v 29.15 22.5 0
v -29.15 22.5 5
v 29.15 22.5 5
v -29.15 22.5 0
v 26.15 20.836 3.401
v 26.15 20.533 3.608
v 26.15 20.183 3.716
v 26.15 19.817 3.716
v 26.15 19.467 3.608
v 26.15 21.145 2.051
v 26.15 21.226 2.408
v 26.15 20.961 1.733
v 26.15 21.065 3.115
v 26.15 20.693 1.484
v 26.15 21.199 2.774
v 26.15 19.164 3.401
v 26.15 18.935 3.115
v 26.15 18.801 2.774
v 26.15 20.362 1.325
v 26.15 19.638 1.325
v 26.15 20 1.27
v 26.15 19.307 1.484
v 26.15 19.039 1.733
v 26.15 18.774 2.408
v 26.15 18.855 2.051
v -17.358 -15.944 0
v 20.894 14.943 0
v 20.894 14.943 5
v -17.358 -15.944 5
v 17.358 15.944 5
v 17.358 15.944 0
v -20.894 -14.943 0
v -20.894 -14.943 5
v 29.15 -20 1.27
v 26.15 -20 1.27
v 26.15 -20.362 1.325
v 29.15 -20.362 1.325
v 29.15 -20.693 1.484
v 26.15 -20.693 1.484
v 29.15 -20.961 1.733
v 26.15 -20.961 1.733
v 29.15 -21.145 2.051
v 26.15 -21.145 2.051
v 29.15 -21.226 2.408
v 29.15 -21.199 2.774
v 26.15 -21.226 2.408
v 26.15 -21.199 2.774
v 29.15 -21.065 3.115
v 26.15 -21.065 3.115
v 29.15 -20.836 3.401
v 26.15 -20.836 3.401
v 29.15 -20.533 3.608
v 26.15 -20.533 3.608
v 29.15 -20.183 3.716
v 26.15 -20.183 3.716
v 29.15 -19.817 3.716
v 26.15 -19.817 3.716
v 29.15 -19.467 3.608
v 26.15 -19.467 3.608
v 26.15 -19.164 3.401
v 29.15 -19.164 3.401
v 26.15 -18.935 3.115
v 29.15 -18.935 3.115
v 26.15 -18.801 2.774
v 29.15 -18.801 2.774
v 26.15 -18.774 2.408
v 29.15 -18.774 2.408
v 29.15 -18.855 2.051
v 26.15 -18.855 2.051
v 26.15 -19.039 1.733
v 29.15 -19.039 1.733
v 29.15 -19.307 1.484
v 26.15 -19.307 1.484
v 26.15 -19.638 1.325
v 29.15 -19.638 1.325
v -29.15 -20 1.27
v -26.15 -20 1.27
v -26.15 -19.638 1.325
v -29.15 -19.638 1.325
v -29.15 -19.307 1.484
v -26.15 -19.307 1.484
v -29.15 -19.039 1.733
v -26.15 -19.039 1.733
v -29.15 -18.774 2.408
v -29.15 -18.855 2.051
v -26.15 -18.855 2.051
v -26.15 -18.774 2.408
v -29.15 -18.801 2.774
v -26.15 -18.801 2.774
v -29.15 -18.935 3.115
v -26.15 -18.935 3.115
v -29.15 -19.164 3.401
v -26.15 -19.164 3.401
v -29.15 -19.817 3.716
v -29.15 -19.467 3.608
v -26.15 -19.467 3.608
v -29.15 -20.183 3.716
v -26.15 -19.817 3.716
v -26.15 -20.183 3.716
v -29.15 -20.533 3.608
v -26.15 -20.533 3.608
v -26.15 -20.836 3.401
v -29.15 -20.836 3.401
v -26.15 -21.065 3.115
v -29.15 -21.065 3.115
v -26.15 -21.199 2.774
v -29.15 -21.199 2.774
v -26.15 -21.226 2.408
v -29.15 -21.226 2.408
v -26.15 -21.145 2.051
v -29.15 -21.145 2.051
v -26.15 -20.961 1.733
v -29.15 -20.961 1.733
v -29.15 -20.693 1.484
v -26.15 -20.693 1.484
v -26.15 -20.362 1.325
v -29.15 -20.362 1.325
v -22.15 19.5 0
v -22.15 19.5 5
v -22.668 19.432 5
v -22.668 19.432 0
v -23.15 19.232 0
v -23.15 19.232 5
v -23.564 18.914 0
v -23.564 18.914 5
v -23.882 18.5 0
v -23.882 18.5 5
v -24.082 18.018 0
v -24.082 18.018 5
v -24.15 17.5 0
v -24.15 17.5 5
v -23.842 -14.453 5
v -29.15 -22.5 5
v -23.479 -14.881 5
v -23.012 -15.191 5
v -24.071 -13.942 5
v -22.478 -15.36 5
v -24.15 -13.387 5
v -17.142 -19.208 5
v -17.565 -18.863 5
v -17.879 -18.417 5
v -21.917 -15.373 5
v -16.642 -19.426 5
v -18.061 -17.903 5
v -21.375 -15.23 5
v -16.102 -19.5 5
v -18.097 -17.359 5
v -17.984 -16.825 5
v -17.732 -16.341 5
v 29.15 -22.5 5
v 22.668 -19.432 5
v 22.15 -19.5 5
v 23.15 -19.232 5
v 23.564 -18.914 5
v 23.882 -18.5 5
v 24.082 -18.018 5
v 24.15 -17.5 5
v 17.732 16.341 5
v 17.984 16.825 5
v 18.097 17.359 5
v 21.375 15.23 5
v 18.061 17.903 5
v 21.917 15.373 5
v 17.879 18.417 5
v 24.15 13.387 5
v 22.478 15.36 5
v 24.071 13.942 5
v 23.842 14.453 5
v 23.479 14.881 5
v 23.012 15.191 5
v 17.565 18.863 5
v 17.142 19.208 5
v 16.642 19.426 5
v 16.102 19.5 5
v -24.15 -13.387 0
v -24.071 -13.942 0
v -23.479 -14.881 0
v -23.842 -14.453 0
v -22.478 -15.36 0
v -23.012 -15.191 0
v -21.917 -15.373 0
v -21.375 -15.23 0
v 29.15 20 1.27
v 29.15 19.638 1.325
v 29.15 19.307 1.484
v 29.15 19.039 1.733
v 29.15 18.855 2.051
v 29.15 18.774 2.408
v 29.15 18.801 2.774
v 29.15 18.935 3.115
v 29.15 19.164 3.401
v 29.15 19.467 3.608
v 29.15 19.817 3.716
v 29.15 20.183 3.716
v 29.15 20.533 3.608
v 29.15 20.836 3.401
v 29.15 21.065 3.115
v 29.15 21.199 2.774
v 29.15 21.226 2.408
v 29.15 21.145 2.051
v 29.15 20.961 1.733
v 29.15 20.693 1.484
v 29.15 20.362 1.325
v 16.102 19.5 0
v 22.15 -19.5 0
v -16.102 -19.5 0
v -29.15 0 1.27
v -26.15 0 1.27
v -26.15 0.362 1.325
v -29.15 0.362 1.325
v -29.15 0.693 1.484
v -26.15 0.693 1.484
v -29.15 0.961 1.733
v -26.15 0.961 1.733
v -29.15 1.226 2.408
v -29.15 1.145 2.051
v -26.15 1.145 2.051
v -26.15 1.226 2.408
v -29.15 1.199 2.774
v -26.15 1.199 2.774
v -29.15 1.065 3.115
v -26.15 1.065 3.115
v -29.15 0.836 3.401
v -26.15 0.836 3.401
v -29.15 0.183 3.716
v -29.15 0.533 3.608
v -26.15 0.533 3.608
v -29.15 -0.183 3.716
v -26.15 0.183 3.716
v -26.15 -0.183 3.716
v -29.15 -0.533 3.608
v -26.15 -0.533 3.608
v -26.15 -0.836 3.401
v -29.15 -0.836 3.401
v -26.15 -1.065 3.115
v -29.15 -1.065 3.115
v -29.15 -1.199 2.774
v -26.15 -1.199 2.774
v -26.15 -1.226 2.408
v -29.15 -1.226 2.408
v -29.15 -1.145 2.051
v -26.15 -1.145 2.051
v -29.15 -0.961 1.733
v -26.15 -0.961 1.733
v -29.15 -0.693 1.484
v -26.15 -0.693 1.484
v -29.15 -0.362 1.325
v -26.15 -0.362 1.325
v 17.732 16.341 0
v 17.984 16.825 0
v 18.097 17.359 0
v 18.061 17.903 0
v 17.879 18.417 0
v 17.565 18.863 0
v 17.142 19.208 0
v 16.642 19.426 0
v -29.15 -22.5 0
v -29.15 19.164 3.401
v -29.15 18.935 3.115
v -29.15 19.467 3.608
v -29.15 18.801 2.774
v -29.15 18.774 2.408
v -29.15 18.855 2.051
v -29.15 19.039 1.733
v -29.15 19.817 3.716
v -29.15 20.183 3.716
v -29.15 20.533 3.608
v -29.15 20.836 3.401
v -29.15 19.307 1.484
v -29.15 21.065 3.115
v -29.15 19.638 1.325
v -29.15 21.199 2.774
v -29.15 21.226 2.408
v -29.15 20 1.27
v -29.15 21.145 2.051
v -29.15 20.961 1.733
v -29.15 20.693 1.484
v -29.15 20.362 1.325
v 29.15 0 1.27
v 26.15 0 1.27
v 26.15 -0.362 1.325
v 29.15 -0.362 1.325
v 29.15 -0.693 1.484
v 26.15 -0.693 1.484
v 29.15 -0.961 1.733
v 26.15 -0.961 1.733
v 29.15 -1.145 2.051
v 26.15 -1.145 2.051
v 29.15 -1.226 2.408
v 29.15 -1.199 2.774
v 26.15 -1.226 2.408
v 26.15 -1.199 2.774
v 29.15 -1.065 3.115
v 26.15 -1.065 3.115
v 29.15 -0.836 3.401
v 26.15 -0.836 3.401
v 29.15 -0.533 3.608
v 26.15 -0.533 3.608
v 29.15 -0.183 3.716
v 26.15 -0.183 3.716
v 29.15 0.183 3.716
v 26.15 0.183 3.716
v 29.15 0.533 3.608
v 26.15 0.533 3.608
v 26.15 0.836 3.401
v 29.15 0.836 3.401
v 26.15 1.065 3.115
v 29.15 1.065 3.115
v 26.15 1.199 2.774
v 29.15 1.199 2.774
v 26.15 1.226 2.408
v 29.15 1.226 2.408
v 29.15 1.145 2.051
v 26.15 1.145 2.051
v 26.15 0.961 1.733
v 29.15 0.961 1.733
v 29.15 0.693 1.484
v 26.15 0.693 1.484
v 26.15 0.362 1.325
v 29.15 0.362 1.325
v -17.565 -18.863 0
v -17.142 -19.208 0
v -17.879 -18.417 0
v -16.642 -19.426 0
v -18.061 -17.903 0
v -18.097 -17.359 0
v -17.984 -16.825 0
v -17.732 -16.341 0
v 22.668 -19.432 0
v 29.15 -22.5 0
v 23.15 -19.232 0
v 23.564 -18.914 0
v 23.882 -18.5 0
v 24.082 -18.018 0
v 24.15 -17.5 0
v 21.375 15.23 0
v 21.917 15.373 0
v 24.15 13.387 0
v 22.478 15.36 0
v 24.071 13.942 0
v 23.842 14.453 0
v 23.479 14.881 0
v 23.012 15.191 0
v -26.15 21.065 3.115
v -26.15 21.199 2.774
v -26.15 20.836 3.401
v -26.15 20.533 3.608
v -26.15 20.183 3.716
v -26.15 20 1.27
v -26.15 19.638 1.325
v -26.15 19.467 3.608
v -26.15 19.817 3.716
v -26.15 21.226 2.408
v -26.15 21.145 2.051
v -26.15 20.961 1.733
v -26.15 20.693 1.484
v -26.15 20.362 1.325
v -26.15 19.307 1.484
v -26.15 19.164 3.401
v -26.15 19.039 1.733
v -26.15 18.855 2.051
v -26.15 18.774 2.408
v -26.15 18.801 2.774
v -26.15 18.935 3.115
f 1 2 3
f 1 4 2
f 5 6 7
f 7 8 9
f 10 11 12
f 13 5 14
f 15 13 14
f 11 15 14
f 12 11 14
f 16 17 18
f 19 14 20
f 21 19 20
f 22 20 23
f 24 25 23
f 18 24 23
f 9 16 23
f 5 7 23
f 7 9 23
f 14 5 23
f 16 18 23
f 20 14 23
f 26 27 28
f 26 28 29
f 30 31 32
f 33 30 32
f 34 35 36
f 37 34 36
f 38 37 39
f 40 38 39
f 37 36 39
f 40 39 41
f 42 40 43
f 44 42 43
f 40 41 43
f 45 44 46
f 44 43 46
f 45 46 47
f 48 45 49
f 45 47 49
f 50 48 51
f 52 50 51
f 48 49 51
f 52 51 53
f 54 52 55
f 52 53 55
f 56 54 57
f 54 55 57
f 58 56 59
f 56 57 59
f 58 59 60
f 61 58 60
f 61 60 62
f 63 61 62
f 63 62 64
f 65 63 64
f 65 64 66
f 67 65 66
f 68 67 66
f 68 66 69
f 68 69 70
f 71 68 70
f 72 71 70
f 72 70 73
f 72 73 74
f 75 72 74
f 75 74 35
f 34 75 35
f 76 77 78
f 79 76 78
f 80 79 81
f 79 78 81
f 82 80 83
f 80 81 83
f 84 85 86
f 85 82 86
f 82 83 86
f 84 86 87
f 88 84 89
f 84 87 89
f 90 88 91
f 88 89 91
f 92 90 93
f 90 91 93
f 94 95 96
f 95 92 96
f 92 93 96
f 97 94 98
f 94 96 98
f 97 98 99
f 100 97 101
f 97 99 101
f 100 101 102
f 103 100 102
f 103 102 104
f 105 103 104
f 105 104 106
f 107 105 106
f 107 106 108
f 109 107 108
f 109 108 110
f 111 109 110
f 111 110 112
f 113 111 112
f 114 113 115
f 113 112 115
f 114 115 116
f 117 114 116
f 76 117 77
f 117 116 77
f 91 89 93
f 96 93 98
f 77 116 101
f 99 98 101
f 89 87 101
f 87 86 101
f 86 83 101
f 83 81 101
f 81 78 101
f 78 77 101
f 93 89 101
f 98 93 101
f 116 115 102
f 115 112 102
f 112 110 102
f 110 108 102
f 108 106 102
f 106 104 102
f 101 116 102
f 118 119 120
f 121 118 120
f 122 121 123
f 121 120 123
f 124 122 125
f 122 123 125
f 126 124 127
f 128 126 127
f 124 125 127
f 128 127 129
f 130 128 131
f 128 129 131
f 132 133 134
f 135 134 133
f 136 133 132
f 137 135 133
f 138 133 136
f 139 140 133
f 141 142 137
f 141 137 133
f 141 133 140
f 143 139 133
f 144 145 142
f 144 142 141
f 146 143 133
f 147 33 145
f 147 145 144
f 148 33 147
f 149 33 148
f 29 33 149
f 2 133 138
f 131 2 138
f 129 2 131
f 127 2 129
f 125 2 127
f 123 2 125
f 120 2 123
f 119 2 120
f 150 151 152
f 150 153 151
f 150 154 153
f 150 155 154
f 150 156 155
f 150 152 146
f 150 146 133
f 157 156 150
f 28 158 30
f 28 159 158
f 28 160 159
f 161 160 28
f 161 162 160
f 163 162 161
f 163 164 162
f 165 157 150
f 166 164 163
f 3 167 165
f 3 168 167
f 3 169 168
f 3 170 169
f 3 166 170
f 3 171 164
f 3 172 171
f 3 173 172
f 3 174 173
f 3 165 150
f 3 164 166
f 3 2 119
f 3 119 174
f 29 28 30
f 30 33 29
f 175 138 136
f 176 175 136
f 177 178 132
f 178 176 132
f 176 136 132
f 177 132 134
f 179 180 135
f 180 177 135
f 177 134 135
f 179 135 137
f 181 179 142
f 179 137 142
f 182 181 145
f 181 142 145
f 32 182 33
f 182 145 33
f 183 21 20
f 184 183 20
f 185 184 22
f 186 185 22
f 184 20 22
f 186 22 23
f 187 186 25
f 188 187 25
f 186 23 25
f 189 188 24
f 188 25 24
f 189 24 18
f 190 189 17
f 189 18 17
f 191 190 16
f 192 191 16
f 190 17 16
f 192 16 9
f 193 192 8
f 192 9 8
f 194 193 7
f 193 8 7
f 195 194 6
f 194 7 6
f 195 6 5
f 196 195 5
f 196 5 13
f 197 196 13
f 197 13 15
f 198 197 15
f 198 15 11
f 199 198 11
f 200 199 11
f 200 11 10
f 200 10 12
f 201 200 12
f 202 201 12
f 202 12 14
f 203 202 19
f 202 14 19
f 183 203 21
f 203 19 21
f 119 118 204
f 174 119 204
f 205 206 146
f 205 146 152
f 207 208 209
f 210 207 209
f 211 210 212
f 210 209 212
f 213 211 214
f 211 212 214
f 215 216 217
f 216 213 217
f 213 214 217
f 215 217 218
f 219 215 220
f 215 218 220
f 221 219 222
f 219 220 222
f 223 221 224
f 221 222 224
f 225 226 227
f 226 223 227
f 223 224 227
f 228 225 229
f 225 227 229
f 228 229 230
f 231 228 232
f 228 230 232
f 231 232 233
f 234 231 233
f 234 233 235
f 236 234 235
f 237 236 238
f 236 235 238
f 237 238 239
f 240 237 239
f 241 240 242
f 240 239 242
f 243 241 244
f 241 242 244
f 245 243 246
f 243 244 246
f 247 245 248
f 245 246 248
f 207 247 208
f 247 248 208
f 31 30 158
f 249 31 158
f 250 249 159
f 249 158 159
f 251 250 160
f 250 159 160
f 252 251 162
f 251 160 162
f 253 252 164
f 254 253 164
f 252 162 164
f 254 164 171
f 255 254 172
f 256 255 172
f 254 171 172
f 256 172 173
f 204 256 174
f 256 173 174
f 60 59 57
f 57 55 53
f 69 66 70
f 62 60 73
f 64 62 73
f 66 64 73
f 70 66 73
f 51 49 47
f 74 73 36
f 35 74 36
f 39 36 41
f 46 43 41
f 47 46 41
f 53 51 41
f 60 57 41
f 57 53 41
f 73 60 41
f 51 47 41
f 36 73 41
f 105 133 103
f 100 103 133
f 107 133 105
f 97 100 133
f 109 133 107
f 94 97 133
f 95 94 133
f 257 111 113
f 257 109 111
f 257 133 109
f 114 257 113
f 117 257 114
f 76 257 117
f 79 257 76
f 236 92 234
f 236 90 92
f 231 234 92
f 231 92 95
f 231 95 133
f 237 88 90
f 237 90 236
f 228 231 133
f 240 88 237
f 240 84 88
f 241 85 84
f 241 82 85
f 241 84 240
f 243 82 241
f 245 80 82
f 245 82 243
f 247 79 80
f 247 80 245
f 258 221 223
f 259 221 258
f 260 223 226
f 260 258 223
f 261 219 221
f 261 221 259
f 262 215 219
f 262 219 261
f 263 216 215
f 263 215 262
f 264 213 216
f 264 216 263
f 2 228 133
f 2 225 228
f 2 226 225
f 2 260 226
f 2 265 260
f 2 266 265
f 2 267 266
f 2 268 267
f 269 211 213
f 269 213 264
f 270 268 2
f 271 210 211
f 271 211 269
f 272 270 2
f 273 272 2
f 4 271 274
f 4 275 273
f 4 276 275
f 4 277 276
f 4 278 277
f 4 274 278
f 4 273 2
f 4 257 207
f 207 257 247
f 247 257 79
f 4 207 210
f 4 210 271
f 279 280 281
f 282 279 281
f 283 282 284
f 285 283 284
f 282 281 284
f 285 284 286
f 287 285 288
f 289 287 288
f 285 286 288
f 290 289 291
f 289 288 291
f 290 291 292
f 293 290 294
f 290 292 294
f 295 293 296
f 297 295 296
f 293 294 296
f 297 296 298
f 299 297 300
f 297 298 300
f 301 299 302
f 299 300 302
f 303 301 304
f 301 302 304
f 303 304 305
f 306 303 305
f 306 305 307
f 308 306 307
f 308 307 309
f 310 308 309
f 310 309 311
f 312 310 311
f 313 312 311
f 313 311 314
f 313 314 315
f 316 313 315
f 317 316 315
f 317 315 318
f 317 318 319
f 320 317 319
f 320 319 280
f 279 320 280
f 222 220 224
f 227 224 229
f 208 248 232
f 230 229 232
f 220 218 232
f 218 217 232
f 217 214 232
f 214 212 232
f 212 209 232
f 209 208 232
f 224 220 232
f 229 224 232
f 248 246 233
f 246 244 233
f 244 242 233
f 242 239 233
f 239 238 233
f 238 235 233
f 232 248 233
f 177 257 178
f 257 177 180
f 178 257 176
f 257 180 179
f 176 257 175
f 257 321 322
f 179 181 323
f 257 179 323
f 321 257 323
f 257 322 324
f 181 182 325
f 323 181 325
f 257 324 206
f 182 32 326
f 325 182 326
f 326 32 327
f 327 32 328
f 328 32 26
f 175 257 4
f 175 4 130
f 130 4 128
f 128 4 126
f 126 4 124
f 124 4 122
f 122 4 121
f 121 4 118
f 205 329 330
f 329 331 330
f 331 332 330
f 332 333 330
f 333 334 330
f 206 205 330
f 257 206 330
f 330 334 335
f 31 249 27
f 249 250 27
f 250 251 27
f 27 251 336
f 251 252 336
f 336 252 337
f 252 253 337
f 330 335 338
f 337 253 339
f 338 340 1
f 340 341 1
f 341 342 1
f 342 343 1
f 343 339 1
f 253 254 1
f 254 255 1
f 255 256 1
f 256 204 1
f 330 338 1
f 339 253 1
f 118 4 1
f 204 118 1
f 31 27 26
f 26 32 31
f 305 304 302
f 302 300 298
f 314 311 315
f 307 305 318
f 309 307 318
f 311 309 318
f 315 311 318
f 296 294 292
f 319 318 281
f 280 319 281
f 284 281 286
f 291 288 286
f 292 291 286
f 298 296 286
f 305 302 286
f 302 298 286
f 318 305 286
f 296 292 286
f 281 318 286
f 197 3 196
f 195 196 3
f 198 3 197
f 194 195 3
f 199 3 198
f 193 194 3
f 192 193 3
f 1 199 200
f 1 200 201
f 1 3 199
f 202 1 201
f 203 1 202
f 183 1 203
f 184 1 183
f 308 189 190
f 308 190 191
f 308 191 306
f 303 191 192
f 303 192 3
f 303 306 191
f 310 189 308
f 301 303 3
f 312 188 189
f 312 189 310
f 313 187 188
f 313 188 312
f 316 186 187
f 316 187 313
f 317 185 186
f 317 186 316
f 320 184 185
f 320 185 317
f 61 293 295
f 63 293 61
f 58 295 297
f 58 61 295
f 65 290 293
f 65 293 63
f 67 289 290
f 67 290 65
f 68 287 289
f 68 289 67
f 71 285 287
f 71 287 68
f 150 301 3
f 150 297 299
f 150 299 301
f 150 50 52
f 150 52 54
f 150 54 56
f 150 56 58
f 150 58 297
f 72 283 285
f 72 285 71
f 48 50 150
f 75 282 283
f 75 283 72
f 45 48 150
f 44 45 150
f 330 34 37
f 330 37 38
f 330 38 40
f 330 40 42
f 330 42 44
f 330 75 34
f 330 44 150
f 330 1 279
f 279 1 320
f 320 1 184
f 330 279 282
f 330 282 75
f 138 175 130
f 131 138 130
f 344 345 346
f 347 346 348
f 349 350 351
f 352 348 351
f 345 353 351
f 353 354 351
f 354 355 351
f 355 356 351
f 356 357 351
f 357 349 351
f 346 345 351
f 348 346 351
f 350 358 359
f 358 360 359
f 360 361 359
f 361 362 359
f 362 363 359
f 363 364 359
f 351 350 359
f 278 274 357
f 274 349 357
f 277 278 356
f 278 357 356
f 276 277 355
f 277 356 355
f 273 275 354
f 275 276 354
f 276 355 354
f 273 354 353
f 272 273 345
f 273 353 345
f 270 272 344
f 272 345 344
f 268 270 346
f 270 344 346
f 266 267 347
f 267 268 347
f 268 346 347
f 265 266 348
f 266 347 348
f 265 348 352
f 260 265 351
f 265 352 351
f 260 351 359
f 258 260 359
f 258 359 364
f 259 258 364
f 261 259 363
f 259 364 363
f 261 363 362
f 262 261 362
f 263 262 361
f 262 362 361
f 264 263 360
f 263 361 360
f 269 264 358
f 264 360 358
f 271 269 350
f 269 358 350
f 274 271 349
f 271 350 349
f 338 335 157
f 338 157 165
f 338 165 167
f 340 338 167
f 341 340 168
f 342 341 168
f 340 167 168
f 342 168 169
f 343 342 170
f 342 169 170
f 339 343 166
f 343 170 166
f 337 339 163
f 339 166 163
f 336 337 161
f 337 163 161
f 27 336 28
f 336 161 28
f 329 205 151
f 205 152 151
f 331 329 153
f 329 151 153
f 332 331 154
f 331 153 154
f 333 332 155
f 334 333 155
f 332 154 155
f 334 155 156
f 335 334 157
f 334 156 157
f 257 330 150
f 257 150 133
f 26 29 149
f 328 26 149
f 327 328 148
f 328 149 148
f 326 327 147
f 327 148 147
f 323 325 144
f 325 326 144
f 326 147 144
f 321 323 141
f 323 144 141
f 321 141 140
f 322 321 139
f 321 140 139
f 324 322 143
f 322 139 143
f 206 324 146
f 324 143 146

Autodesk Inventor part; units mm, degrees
ref_plane "YZ Plane" through (0, 0, 0) normal (1, 0, 0) x (0, 1, 0)
ref_plane "XZ Plane" through (0, 0, 0) normal (0, 1, 0) x (-1, 0, 0)
ref_plane "XY Plane" through (0, 0, 0) normal (0, 0, 1) x (1, 0, 0)
sketch "スケッチ1" plane through (0, 0, 0) normal (0, 0, 1) x (1, 0, 0)
  line L0 (-29.15, 22.5) -> (29.15, 22.5)
  line L1 (29.15, 22.5) -> (29.15, -22.5)
  line L2 (29.15, -22.5) -> (-29.15, -22.5)
  line L3 (-29.15, -22.5) -> (-29.15, 22.5)
  line L4 (-24.15, 19.5) -> (24.15, 19.5) construction
  line L5 (24.15, 19.5) -> (24.15, -19.5) construction
  line L6 (24.15, -19.5) -> (-24.15, -19.5) construction
  line L7 (-24.15, -19.5) -> (-24.15, 19.5) construction
  line L8 (24.15, 19.5) -> (-24.15, -19.5) construction
  line L9 (-24.15, -17.5721) -> (-24.15, 19.5)
  line L10 (-24.15, 19.5) -> (21.7623, 19.5)
  line L11 (21.7623, 19.5) -> (-24.15, -17.5721)
  line L12 (-21.7623, -19.5) -> (24.15, -19.5)
  line L13 (24.15, -19.5) -> (24.15, 17.5721)
  line L14 (24.15, 17.5721) -> (-21.7623, -19.5)
  line L15 (-29.15, 20) -> (29.15, 20) construction
  line L16 (29.15, -20) -> (-29.15, -20) construction
  line L17 (29.15, 20) -> (29.15, -20) construction
  point P0 (0, 0)
  point P1 (0, 19.5)
  point P2 (0, 22.5)
  point P3 (24.15, 0)
  point P4 (29.15, 0)
  dimension "d0" = 5
  dimension "d1" = 3
  dimension "d2" = 1.5
  dimension "d3" = 40
  dimension "d4" = 2.5
  dimension "d19" = 58.3
extrude "押し出し1" add sketch "スケッチ1" along normal blind 5
sketch "スケッチ2" plane through (29.15, -22.5, 0) normal (1, 0, 0) x (0, 0, -1)
  line L0 (0, 45) -> (-5, 45) projected
  line L1 (-5, 0) -> (-5, 45) projected
  line L2 (0, 22.5) -> (-5, 22.5) construction
  point P0 (-2.5, 2.5)
  point P1 (-2.5, 22.5)
  point P2 (-2.5, 42.5)
  point P3 (-2.5, 45)
  dimension "d7" = 40
hole "穴1" at (29.15, -20, 2.5) at (29.15, 0, 2.5) at (29.15, 20, 2.5) direction (-1, 0, 0) diameter 2.459 depth 3 thread size "M3x0.5" class "6H" standard "ISO Metric profile"
mirror "ミラー1" about plane through (0, 0, 0) normal (1, 0, 0) of "穴1"
fillet "フィレット1" radius 2 6 edges at (-21.7623, -19.5, 2.5) (-24.15, -17.5721, 2.5) (24.15, 17.5721, 2.5) (24.15, -19.5, 2.5) (-24.15, 19.5, 2.5) (21.7623, 19.5, 2.5)
equation "\"d3\" = d11_1"
equation "\"d7\" = d3"
equation "\"d11_1\" = 40"
properties part number "リンク_ふくらはぎ_サブフレーム_1_1(予備案)" material "アルミニウム 2014-T4"
